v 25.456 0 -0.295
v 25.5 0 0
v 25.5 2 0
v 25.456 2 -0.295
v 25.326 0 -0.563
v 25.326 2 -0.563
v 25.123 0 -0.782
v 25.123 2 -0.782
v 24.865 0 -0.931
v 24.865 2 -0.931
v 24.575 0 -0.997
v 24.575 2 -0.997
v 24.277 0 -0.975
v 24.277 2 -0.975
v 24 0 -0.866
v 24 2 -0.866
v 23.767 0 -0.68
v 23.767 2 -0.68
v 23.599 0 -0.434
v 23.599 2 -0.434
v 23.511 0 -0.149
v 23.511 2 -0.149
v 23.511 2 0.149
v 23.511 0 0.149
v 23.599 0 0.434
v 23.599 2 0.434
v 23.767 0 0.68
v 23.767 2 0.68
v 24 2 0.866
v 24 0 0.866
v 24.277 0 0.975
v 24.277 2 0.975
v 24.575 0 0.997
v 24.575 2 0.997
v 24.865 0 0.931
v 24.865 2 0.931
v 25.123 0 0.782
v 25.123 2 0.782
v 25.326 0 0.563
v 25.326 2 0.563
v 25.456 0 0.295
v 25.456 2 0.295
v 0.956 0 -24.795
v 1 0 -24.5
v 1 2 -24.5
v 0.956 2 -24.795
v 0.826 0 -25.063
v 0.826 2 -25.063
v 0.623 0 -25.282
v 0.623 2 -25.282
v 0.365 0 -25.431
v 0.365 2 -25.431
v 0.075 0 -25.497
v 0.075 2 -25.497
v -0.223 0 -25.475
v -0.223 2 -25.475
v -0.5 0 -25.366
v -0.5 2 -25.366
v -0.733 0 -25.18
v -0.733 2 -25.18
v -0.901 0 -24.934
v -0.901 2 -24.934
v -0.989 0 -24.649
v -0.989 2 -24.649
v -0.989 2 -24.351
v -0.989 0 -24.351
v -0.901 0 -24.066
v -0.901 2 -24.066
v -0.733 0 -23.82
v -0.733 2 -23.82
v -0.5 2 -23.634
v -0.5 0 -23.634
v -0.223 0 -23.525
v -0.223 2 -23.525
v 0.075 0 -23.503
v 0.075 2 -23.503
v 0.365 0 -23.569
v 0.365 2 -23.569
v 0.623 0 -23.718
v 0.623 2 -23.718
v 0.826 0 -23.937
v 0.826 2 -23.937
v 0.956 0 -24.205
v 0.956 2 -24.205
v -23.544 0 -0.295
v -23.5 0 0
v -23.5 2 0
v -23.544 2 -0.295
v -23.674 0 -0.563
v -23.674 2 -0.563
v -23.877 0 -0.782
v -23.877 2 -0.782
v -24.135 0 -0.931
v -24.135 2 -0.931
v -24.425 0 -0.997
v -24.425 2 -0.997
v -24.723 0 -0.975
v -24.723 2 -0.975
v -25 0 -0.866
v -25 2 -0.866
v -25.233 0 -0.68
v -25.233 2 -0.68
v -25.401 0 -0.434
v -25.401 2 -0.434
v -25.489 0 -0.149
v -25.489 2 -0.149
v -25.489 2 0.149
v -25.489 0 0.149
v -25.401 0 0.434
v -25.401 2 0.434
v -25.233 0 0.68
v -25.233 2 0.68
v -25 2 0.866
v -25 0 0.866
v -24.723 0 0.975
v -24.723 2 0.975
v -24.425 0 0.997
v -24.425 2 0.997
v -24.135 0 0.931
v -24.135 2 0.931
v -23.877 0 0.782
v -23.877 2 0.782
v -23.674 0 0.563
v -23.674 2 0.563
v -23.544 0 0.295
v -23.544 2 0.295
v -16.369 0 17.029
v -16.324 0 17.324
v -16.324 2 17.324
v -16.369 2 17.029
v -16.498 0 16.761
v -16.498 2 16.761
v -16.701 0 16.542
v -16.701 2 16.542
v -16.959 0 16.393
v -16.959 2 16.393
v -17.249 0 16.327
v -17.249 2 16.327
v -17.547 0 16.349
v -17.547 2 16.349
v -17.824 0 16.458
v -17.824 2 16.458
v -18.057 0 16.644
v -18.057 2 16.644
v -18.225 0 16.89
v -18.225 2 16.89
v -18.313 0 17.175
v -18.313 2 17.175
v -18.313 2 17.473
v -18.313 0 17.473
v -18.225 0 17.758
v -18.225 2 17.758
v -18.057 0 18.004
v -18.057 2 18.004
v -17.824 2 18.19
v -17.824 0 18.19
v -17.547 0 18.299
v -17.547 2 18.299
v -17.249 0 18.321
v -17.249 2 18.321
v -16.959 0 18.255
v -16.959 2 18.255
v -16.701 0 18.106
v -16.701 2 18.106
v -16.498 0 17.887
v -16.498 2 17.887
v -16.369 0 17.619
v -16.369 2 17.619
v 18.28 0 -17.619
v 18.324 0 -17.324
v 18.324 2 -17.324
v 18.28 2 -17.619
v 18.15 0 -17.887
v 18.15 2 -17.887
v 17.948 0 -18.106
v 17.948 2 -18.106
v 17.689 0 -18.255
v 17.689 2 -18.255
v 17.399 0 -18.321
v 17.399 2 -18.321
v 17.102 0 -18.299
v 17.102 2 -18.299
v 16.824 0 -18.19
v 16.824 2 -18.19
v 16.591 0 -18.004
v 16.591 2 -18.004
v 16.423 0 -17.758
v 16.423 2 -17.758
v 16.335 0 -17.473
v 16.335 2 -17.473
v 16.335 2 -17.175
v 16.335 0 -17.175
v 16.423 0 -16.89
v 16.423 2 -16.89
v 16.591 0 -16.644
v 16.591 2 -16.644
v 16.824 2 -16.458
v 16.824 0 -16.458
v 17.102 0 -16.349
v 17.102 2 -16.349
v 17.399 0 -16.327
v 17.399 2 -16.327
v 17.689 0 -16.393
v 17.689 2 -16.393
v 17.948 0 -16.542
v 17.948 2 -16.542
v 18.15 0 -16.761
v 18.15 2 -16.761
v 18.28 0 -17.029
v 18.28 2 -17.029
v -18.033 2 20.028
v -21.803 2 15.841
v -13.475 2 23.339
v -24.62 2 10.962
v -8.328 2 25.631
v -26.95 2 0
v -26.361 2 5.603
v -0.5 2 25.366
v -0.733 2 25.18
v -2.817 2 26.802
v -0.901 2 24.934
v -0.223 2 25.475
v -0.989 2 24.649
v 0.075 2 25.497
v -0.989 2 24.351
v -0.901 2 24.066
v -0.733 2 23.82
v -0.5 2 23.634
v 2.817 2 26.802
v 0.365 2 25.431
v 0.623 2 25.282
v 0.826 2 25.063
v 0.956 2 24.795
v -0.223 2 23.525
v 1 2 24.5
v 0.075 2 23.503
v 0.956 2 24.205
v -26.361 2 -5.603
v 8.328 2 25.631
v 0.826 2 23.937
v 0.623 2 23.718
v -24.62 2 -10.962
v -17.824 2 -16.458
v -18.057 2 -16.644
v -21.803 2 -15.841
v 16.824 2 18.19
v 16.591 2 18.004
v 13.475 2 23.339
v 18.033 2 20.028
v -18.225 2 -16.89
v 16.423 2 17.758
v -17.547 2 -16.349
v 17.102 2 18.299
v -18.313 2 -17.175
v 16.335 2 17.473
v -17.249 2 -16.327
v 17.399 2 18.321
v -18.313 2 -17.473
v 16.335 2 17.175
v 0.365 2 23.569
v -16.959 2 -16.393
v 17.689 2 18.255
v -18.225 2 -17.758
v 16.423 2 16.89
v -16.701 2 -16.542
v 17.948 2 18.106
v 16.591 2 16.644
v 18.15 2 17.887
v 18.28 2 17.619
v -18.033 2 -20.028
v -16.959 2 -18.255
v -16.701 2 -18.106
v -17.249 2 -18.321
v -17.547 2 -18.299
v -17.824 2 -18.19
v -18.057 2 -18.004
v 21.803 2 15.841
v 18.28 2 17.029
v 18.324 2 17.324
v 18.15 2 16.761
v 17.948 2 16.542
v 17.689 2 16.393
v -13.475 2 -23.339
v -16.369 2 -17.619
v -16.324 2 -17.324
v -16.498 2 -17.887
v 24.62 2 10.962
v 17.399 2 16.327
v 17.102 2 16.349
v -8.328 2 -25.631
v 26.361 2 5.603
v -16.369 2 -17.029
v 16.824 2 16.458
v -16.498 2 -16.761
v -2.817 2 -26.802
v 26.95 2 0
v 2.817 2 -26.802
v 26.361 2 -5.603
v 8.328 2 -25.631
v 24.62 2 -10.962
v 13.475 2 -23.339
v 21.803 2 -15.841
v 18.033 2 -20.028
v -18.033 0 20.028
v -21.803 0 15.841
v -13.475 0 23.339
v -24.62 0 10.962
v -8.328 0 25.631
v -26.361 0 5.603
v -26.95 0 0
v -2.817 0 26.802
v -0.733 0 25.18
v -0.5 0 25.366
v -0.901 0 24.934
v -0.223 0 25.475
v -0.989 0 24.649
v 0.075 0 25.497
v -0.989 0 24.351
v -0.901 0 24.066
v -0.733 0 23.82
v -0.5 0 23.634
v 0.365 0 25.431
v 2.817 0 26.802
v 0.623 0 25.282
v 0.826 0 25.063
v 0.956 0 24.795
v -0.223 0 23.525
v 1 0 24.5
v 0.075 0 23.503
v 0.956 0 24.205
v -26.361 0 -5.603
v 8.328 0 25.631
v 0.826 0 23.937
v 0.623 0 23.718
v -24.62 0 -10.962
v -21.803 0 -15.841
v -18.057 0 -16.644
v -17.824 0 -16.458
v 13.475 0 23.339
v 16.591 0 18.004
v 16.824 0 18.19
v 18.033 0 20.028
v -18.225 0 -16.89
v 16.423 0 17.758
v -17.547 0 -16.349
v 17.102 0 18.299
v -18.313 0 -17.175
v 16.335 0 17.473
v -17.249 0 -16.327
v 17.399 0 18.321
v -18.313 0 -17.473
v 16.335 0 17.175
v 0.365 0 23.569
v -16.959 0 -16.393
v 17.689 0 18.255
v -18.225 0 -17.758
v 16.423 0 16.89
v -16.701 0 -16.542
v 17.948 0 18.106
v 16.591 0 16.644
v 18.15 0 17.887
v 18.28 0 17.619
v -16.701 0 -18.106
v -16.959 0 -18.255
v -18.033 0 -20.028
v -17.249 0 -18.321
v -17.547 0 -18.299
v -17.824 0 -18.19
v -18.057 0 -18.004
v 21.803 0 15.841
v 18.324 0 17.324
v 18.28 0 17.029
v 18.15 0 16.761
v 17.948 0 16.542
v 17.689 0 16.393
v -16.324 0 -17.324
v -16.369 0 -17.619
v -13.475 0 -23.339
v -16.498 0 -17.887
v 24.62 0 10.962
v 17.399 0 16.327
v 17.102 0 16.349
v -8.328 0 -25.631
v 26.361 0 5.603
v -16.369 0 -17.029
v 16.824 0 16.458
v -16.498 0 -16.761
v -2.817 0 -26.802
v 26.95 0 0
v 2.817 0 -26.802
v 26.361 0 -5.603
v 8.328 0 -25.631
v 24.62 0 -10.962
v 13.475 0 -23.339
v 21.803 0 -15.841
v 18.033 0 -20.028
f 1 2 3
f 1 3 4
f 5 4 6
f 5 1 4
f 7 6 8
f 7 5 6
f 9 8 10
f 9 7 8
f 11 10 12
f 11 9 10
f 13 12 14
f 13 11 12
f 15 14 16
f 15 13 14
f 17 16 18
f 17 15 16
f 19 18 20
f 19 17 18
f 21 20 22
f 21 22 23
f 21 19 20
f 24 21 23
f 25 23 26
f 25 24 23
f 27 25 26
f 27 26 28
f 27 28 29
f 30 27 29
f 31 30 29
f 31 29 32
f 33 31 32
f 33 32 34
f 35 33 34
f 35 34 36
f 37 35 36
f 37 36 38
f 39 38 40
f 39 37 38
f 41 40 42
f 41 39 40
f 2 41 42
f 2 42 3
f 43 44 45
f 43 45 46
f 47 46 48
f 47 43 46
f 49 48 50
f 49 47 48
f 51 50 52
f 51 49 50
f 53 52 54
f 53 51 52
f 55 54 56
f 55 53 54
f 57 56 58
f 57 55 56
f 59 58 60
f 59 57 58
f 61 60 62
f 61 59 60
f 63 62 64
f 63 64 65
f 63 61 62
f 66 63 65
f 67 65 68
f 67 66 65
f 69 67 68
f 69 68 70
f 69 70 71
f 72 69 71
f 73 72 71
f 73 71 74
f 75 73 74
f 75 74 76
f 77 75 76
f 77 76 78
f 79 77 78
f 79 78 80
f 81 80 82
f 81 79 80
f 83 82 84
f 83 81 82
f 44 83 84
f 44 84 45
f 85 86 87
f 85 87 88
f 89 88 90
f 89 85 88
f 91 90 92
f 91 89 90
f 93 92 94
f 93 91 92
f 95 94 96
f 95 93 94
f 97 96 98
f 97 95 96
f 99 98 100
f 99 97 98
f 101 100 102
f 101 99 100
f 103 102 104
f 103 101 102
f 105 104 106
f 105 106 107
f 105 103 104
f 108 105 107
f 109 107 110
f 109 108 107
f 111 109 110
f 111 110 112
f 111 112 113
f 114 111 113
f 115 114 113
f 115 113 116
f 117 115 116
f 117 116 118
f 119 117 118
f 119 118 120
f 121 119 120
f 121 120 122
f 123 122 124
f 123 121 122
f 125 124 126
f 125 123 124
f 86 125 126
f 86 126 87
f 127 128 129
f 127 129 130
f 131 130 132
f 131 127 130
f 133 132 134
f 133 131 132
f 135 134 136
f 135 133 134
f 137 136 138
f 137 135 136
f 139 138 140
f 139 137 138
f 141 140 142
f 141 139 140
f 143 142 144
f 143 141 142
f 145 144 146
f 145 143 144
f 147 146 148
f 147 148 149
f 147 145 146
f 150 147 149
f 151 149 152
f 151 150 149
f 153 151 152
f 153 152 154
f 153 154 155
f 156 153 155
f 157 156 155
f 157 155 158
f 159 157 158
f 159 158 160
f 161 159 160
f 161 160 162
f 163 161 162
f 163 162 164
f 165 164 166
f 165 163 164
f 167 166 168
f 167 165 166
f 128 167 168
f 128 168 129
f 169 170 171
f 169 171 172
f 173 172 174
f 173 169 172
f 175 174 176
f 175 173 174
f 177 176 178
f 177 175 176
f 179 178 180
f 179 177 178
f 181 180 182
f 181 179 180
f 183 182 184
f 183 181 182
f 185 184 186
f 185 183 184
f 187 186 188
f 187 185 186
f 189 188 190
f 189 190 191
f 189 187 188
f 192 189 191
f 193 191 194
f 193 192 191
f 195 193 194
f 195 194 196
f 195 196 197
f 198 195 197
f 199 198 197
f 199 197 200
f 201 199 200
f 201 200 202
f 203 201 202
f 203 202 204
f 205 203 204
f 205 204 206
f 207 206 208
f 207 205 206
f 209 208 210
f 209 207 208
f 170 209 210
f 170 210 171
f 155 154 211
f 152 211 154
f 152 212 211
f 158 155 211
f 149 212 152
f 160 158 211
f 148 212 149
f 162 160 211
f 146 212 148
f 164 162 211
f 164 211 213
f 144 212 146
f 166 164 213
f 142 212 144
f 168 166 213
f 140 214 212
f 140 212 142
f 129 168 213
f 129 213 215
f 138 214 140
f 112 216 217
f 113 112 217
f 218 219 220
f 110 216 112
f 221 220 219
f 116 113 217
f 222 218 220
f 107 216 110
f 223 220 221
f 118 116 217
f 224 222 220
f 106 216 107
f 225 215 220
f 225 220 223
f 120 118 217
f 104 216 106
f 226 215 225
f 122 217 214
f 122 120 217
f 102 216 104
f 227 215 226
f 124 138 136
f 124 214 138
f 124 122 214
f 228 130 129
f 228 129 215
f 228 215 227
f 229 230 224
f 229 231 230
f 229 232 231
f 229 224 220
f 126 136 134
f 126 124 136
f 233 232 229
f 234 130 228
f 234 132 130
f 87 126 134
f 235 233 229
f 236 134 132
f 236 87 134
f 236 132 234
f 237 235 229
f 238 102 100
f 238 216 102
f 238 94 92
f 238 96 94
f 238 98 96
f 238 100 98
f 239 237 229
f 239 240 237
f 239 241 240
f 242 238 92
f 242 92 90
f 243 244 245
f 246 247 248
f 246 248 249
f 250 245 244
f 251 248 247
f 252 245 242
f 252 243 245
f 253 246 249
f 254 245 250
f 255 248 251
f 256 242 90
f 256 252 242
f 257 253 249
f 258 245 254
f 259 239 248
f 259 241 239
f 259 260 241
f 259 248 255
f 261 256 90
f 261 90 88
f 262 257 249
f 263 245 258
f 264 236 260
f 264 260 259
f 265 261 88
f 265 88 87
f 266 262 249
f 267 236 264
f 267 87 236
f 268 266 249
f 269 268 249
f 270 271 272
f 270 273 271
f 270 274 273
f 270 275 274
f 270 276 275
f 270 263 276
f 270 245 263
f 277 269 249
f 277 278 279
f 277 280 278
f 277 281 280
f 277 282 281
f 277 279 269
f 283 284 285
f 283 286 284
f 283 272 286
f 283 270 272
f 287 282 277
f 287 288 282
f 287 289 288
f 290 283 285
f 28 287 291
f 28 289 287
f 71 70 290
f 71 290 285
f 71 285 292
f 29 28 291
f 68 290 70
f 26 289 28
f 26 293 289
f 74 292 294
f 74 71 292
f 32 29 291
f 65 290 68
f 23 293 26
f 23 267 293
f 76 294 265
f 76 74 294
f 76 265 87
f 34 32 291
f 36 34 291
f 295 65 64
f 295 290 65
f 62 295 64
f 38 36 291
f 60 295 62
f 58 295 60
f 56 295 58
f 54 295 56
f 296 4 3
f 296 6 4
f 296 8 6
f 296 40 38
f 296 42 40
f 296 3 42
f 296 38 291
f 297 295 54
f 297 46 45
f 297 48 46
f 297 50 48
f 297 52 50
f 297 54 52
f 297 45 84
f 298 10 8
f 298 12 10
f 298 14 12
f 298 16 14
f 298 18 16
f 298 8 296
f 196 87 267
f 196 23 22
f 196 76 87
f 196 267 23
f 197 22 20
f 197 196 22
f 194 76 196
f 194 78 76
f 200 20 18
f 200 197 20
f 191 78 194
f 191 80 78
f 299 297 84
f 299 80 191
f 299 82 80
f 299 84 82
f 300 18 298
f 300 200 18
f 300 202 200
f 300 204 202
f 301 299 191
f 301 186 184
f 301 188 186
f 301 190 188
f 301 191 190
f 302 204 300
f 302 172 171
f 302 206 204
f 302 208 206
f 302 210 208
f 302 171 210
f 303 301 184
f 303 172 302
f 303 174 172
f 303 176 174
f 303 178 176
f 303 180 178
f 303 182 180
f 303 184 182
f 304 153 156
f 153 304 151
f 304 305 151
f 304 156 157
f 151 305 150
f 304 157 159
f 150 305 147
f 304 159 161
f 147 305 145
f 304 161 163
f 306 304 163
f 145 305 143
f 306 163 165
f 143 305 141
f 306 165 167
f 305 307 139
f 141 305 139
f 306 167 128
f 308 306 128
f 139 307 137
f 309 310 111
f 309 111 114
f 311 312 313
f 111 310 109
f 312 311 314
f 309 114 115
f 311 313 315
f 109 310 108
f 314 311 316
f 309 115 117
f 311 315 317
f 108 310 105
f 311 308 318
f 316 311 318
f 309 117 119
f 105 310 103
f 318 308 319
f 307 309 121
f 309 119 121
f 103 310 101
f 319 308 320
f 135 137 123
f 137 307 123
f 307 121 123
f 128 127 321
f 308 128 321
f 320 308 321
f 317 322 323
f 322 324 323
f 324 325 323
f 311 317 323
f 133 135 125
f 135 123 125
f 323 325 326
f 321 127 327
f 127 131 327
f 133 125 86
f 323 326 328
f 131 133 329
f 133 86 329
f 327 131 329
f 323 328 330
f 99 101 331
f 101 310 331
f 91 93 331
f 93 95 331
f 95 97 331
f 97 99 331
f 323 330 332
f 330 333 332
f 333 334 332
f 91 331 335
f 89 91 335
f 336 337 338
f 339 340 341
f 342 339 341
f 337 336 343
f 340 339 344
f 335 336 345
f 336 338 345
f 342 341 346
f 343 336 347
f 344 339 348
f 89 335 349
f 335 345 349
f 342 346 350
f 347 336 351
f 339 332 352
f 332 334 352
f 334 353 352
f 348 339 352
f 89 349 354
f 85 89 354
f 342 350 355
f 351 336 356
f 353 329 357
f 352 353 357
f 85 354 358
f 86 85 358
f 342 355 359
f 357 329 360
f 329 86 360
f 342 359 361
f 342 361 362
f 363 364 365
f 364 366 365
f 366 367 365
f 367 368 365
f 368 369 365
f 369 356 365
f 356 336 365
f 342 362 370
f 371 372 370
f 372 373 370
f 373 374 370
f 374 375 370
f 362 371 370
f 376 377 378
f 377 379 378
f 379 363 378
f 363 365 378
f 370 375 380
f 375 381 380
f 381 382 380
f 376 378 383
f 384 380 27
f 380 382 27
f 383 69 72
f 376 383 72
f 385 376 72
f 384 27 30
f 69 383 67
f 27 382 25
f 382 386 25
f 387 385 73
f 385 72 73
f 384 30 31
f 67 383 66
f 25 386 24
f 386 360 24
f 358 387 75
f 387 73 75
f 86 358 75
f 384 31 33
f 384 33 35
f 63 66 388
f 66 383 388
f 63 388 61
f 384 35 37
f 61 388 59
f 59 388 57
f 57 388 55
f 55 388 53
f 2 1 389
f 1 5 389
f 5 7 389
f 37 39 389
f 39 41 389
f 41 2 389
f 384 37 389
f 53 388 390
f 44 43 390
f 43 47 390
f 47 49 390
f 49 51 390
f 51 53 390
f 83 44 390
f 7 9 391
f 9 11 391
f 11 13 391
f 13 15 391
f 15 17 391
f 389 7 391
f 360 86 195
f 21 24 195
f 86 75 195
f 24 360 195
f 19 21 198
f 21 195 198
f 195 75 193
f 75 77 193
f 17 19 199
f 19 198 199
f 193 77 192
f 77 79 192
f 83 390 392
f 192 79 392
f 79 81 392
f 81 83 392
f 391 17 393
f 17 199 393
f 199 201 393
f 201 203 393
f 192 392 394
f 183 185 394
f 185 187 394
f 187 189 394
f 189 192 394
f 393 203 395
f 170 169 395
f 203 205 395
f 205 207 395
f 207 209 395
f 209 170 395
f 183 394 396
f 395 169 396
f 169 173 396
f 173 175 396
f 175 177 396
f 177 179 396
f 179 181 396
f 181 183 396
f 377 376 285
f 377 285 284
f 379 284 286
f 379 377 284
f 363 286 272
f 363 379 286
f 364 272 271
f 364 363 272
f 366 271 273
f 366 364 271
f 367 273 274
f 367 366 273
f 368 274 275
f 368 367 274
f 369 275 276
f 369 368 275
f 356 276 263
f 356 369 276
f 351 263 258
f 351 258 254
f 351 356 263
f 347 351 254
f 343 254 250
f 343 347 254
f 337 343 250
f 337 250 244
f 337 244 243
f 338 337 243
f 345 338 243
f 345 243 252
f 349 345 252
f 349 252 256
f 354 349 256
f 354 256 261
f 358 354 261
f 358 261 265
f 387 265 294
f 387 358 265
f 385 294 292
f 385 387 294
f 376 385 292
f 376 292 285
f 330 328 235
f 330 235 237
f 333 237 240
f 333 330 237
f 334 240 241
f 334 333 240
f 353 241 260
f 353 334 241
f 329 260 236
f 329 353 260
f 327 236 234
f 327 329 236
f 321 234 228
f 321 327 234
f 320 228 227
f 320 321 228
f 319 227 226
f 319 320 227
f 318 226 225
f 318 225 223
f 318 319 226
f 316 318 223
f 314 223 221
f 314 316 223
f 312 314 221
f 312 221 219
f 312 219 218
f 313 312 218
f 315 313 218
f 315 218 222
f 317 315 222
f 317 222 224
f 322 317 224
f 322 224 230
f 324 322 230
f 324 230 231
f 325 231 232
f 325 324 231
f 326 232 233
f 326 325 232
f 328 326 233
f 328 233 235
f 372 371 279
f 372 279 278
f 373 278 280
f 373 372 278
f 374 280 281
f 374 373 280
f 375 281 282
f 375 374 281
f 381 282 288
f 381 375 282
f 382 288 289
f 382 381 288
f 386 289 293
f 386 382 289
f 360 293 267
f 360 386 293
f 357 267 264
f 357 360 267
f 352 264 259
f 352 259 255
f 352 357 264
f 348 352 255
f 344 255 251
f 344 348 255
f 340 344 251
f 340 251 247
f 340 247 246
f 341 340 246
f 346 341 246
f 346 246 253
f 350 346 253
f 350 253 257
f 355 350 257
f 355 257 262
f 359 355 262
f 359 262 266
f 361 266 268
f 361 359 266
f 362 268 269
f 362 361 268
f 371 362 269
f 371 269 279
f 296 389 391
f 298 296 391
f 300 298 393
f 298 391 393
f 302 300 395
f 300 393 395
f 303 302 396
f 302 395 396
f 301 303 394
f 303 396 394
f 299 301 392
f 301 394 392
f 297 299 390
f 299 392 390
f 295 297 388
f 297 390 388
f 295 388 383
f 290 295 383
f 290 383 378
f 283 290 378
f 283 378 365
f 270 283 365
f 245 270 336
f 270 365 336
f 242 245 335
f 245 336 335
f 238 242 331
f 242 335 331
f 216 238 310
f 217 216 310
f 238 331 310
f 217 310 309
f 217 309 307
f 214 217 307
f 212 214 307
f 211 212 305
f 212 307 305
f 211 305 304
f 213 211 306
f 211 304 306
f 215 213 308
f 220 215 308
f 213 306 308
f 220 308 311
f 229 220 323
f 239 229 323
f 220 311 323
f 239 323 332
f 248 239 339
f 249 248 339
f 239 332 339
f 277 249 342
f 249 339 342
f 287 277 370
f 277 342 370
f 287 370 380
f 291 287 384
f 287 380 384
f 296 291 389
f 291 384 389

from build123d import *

# Parameters (mm, degrees)
SKETCH1_R           = 26.95
SKETCH1_R_2         = 1
BOSS_EXTRUDE1_DEPTH = 2


with BuildPart() as part:
    # Sketch1 → Boss-Extrude1 (new body)
    with BuildSketch(Plane(origin=(0, 0, 0), x_dir=(1, 0, 0), z_dir=(0, 1, 0))):
        Circle(SKETCH1_R)
        with Locations((0, 24.5)):
            Circle(SKETCH1_R_2, mode=Mode.SUBTRACT)
        with Locations((17.324116139, 17.324116139)):
            Circle(SKETCH1_R_2, mode=Mode.SUBTRACT)
        with Locations((24.5, 0)):
            Circle(SKETCH1_R_2, mode=Mode.SUBTRACT)
        with Locations((17.324116139, -17.324116139)):
            Circle(SKETCH1_R_2, mode=Mode.SUBTRACT)
        with Locations((0, -24.5)):
            Circle(SKETCH1_R_2, mode=Mode.SUBTRACT)
        with Locations((-17.324116139, -17.324116139)):
            Circle(SKETCH1_R_2, mode=Mode.SUBTRACT)
        with Locations((-24.5, 0)):
            Circle(SKETCH1_R_2, mode=Mode.SUBTRACT)
        with Locations((-17.324116139, 17.324116139)):
            Circle(SKETCH1_R_2, mode=Mode.SUBTRACT)
    extrude(amount=BOSS_EXTRUDE1_DEPTH)


solid = part.part
